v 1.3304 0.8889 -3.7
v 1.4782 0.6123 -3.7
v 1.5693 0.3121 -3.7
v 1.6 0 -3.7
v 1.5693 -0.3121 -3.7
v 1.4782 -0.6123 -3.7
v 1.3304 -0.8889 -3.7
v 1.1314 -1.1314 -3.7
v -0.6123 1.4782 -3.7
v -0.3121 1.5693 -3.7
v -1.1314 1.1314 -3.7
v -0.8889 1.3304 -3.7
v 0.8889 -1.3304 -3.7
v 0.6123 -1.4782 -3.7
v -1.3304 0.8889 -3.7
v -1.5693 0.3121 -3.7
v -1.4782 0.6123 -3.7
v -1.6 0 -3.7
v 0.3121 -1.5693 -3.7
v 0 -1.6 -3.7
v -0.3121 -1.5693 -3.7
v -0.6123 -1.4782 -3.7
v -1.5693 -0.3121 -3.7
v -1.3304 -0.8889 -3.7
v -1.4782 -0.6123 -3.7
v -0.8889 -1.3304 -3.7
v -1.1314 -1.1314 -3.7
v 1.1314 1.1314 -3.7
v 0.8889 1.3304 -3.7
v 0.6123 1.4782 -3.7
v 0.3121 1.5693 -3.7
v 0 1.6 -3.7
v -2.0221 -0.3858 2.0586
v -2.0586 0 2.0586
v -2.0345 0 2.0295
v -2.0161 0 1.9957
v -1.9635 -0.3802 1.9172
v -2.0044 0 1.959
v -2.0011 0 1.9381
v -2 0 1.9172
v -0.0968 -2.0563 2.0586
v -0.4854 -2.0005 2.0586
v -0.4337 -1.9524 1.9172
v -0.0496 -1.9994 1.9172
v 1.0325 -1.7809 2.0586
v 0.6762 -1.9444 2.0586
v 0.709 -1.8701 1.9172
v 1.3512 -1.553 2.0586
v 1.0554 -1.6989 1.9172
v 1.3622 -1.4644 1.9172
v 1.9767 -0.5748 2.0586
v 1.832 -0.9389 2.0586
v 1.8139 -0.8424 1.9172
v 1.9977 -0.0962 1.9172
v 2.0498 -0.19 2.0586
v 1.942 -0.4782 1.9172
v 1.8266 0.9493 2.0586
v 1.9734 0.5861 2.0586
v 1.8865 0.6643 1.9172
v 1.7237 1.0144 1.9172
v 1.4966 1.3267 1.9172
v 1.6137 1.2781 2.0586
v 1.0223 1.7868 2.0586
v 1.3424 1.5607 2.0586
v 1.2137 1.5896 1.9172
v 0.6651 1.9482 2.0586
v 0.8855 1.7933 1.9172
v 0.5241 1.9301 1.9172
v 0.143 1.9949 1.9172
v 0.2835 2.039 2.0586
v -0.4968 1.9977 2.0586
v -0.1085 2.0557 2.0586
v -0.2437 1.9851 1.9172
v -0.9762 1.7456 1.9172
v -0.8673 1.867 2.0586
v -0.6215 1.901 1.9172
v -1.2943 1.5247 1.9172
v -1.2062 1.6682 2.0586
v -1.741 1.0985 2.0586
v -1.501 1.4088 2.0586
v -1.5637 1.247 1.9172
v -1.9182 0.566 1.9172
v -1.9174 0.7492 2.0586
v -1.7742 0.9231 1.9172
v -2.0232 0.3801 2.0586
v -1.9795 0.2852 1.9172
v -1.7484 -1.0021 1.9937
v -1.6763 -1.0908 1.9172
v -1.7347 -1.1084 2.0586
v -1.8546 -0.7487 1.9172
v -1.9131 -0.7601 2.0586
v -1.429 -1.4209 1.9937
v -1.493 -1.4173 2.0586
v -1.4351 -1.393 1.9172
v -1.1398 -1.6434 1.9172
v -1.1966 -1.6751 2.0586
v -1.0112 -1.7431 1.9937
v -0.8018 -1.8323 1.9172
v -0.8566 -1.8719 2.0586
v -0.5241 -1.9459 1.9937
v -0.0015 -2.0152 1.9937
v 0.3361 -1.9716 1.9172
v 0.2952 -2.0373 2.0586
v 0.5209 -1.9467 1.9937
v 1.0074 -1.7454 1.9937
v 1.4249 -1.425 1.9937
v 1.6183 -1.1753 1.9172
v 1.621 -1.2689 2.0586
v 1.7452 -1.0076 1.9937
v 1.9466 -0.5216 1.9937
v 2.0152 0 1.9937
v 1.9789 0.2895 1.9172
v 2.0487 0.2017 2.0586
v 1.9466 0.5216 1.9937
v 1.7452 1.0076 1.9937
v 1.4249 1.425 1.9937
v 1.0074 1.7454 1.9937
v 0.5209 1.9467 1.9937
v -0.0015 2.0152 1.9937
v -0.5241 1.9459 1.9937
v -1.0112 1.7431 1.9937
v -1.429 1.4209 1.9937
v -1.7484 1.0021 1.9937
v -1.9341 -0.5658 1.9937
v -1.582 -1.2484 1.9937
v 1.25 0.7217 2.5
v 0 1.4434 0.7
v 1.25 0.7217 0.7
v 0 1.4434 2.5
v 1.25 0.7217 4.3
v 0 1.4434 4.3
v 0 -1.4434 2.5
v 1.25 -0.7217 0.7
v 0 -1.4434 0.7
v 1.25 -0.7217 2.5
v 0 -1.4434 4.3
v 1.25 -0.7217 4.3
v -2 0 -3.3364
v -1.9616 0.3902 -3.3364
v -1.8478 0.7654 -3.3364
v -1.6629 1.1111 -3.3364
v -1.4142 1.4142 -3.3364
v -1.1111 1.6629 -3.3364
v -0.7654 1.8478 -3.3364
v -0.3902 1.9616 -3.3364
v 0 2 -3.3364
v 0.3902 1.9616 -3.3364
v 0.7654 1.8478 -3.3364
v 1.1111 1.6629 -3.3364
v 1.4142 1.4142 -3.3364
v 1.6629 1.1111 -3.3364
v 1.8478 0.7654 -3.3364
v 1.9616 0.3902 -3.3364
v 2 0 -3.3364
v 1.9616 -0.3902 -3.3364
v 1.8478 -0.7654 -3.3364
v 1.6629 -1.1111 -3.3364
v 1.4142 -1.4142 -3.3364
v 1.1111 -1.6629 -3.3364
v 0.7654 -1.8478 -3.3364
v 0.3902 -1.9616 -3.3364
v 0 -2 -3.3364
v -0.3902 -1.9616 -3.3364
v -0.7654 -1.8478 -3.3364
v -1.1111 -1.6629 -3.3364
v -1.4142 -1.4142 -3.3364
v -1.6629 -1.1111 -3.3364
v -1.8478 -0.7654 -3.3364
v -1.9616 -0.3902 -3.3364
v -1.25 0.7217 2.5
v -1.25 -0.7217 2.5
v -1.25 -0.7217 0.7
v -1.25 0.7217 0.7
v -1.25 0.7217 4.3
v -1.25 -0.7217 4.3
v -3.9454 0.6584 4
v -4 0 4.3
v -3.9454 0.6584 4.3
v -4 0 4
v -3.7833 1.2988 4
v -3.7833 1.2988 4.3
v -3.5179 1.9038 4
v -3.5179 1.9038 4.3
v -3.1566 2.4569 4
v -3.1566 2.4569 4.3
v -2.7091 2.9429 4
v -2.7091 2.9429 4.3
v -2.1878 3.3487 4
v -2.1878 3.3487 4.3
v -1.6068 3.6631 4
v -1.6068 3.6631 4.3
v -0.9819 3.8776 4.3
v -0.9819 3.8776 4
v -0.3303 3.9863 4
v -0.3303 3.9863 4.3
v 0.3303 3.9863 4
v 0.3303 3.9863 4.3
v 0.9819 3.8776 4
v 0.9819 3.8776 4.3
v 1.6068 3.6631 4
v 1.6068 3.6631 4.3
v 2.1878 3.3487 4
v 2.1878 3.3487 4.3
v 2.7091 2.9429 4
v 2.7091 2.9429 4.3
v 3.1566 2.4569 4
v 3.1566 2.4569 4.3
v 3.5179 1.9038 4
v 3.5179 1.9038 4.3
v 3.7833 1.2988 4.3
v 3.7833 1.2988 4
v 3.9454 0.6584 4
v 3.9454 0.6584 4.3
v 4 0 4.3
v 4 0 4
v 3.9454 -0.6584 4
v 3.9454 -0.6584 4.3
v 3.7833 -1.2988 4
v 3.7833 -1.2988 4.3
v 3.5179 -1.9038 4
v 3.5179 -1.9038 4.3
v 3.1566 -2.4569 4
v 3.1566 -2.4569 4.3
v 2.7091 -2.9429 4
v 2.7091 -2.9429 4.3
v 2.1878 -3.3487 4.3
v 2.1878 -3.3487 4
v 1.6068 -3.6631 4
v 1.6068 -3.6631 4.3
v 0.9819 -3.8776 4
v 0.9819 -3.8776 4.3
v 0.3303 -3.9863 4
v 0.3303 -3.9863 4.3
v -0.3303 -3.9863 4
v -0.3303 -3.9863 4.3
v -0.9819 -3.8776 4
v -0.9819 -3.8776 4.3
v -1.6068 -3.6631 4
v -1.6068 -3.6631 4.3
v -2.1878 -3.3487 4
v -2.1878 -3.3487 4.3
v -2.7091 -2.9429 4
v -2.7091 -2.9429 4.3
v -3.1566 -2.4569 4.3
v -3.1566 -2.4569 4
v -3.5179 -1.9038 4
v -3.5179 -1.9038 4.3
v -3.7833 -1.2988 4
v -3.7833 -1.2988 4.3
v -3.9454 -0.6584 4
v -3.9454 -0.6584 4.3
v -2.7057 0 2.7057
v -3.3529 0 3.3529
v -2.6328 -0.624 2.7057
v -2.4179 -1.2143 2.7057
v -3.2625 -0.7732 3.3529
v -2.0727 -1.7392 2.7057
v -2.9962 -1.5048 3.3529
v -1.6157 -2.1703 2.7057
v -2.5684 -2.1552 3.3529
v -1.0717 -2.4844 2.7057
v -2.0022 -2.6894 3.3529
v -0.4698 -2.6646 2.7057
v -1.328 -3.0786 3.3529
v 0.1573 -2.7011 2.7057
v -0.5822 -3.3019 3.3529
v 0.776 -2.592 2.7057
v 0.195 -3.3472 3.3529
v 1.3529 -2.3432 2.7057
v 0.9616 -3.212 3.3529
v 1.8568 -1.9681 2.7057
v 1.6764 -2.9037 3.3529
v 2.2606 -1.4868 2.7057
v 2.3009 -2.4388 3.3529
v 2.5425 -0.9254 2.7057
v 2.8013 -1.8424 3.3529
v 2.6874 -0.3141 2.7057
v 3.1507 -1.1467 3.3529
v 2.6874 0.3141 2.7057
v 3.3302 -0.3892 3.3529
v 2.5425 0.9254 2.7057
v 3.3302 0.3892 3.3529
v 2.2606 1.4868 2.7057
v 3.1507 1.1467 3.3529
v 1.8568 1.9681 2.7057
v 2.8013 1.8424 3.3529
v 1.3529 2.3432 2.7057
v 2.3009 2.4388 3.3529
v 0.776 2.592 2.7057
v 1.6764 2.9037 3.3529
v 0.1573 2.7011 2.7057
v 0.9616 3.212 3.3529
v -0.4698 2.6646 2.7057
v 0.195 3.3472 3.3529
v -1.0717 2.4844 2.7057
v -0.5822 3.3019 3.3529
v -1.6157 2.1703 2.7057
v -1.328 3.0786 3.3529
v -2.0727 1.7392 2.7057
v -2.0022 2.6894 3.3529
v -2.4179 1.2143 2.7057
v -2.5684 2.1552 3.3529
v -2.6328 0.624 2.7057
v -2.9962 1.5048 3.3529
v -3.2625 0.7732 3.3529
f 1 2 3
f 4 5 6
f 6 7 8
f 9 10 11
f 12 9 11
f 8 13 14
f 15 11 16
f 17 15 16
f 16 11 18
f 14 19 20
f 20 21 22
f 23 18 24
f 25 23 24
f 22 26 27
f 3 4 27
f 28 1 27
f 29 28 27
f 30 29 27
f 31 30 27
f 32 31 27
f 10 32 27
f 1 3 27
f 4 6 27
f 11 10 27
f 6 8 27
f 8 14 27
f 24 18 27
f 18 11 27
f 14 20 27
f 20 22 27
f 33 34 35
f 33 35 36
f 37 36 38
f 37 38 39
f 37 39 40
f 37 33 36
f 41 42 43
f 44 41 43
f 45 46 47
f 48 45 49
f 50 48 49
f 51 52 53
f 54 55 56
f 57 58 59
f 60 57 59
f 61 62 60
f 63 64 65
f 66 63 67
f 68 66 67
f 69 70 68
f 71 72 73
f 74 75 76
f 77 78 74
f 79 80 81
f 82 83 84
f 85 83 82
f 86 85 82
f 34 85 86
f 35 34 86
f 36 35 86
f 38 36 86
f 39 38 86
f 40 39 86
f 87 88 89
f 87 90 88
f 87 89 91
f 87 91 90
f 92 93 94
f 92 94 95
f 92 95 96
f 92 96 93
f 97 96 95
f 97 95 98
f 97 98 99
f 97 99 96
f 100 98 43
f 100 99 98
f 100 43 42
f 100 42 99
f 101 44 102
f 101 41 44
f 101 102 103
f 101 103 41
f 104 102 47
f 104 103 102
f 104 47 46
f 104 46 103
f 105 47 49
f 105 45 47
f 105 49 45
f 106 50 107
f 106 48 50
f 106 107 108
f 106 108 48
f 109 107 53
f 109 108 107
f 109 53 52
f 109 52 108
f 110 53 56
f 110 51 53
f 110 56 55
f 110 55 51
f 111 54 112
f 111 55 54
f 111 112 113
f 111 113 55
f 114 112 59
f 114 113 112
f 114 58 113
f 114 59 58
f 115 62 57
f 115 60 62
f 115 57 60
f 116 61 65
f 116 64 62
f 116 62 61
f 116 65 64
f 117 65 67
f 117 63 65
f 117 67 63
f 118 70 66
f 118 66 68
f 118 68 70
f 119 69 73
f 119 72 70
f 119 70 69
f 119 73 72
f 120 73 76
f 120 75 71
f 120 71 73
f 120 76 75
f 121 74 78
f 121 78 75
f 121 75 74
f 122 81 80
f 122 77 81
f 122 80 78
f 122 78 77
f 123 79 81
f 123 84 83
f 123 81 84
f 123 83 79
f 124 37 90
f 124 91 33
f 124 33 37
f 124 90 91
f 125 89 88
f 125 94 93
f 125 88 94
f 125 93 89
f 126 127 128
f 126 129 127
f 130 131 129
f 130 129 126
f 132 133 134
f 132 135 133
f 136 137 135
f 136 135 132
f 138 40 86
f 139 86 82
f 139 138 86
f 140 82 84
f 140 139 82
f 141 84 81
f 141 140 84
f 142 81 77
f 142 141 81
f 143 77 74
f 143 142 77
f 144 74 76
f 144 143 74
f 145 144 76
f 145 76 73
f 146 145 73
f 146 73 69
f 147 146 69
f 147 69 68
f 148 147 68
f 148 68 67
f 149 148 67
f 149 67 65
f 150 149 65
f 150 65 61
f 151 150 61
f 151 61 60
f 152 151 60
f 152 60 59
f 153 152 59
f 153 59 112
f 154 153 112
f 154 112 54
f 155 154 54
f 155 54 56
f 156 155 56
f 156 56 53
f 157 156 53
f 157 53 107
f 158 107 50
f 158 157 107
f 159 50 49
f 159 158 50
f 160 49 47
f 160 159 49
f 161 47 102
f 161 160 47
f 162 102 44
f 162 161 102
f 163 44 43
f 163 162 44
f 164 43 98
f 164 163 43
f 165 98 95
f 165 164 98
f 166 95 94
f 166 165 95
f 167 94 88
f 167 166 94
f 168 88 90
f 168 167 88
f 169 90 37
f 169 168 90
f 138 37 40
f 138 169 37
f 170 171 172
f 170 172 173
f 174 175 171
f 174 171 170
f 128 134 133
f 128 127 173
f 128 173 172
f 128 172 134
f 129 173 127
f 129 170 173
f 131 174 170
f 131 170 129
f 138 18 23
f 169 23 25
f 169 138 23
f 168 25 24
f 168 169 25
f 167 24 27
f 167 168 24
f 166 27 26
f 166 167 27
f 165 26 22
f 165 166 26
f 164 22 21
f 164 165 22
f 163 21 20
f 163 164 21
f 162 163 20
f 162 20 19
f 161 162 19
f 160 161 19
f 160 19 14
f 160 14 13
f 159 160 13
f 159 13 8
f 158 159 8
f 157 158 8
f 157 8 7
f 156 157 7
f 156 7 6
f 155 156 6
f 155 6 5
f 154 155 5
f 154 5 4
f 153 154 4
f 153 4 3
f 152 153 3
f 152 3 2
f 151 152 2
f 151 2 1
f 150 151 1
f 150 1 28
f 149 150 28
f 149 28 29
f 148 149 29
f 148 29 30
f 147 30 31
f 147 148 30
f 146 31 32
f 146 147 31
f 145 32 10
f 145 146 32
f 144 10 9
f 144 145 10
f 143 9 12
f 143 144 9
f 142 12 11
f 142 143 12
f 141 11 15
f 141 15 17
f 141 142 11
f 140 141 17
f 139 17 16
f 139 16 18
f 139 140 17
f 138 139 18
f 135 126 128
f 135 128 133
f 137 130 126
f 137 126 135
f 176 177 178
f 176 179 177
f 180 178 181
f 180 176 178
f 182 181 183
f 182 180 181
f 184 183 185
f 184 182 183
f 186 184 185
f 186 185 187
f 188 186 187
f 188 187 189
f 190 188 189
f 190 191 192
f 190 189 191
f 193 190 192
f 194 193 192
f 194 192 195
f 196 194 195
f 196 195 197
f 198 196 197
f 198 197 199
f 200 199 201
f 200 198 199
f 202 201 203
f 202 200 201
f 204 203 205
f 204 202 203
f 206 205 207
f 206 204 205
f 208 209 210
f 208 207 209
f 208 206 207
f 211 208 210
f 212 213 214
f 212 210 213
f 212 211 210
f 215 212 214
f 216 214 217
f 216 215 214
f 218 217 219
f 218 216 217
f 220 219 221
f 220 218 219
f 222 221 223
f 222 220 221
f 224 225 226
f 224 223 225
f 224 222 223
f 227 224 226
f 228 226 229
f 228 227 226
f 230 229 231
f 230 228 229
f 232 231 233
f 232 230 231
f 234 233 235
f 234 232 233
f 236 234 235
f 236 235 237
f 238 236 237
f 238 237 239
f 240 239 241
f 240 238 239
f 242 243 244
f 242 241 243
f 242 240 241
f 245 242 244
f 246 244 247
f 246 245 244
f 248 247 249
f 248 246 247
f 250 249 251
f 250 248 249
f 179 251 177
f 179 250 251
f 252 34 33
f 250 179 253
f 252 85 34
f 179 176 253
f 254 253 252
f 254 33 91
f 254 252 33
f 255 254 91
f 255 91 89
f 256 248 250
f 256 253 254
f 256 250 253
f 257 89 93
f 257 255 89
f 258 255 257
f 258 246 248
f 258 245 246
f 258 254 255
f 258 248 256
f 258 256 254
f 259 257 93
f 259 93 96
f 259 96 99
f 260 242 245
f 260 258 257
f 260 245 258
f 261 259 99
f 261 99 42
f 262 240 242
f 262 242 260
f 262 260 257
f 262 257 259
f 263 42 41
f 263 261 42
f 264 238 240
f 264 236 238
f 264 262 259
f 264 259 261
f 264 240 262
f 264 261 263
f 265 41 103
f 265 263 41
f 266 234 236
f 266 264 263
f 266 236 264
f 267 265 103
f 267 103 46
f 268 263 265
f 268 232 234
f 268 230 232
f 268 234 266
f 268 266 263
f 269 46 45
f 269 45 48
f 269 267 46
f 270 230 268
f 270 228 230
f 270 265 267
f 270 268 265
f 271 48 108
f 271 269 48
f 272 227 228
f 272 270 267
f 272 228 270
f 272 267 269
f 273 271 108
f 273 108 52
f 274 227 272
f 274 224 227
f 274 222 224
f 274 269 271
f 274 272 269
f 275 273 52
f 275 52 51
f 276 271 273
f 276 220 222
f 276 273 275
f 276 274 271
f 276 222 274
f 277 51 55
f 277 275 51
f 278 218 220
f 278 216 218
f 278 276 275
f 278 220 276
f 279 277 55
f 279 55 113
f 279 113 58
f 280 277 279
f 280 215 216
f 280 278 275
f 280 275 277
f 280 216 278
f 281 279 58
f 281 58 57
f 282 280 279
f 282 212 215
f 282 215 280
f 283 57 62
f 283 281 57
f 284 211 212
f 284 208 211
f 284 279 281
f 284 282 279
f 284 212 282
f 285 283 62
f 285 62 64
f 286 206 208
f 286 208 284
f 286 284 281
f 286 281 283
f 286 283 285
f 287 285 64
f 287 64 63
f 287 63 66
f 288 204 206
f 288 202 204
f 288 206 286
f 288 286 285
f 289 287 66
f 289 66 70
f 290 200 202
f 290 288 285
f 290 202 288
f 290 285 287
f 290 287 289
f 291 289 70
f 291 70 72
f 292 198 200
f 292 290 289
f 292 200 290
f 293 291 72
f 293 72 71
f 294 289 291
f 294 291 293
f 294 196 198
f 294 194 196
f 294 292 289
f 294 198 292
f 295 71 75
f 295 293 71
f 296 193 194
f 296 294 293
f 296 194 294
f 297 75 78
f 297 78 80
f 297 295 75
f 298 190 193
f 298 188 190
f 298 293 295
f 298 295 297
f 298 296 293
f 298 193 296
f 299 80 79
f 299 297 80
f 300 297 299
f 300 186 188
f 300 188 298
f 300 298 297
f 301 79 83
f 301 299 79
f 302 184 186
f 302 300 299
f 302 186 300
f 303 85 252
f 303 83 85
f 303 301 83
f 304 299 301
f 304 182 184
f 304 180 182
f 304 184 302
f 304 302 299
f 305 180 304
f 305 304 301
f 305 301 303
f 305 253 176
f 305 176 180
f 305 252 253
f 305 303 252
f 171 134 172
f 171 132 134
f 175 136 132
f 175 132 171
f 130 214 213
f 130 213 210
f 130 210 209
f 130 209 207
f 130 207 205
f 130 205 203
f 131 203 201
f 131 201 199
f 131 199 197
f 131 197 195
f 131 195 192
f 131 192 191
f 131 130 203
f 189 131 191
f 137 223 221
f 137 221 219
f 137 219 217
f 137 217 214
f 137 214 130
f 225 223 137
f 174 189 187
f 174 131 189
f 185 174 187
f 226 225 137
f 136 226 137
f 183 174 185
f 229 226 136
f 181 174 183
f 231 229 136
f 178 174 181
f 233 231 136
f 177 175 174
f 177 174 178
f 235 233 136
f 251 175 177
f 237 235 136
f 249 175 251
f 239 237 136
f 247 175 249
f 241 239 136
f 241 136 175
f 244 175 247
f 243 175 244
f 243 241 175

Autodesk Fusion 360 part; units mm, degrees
sketch "Sketch1" plane through (0, 0, 0) normal (0, 1, 0) x (1, 0, 0)
  line L0 (0, -4.3) -> (-4, -4.3)
  line L1 (-4, -4.3) -> (-4, -4)
  line L2 (-4, -4) -> (-2, -2)
  line L3 (-2, -2) -> (-2, 3.7)
  line L4 (-2, -2) -> (0, 0) construction
  line L5 (-2, 3.7) -> (0, 3.7)
  line L6 (0, 3.7) -> (0, -4.3)
  dimension "d5" = 45
  dimension "d9" = 4
  dimension "d10" = 8
  dimension "d72" = 2.3
  dimension "d73" = 8
revolve "Revolve1" add sketch "Sketch1" angle 360 about axis through (0, 0, -3.7) along (0, 0, 1)
sketch "Sketch6" plane through (0, 0, 4.3) normal (0, 0, 1) x (1, 0, 0)
  circle A0 centre (0, 0) radius 4
  line L0 (-1.25, 0) -> (1.25, 0) construction
  line L1 (-1.25, -0.7217) -> (-1.25, 0.7217)
  line L2 (-1.25, 0.7217) -> (0, 0)
  line L3 (-1.25, -0.7217) -> (0, 0)
  dimension "d65" = 2.5
  dimension "d67" = 60
extrude "Extrude1" cut sketch "Sketch6" against normal blind 1.8 contours L1 L2 L3
pattern_circular "C-Pattern1" count 6 over 360 about axis through (0, 0, 1.75) along (0, 0, 1) of "Extrude1"
extrude "Extrude2" cut 1 faces at (-0.4167, -0.2406, 2.5) along direction (0, 0, -1) blind 1.8
fillet "Fillet6" radius 0.2 1 edges at (-1.8647, 0.7232, 2)
thread "Thread2" thread offset 0 thread length 4.3
sketch "Sketch8" plane through (0, 0, 0) normal (0, 1, 0) x (1, 0, 0)
  line L0 (-4, -4.3) -> (-4, -4)
  line L1 (-4, -4) -> (-2, -2)
  line L2 (0, 3.7) -> (0, -4.3)
  line L3 (0, -4.3) -> (-4, -4.3)
  line L4 (0, 3.7) -> (-2.04, 3.7)
  line L5 (-2.04, 3.7) -> (-2.04, 3.3)
  line L6 (-2.04, 3.3) -> (-1.6, 3.7)
  dimension "d104" = 1.6
  dimension "d106" = 2.04
  dimension "d107" = 0.4
revolve "Revolve3" cut sketch "Sketch8" angle 360 about axis through (0, 0, -3.7) along (0, 0, 1)
equation "d5 = adsk_headang * 0.5"
equation "d9 = adsk_nomdia"
equation "d10 = adsk_nomlen"
equation "adsk_nomlen = 8.00 mm"
equation "adsk_headh = 2.30 mm"
equation "adsk_headdia = 8.00 mm"
equation "adsk_nomdia = 4.00 mm"
equation "adsk_headang = 90.00 deg"
equation "adsk_philwidth = 2.50 mm"
equation "adsk_phildepth = 1.80 mm"
equation "d65 = adsk_philwidth"
equation "d72 = adsk_headh"
equation "d73 = adsk_headdia"
equation "d77 = adsk_thrlen"
equation "adsk_thrlen = 4.30 mm"
equation "adsk_midfillet = 0.20 mm"
equation "d85 = adsk_midfillet"
equation "adsk_startlen = adsk_nomdia * 0.1"
equation "adsk_startang = 45 deg"
equation "d99 = ( adsk_nomdia / 2 ) * tan(90 deg - adsk_headang / 2) + adsk_headh"
equation "adsk_endpointdia = adsk_nomdia - 2 * adsk_startlen"
equation "d104 = adsk_endpointdia / 2"
equation "d106 = adsk_nomdia * 0.51"
equation "d107 = adsk_startlen"
properties part number "arrangementsContainer"
